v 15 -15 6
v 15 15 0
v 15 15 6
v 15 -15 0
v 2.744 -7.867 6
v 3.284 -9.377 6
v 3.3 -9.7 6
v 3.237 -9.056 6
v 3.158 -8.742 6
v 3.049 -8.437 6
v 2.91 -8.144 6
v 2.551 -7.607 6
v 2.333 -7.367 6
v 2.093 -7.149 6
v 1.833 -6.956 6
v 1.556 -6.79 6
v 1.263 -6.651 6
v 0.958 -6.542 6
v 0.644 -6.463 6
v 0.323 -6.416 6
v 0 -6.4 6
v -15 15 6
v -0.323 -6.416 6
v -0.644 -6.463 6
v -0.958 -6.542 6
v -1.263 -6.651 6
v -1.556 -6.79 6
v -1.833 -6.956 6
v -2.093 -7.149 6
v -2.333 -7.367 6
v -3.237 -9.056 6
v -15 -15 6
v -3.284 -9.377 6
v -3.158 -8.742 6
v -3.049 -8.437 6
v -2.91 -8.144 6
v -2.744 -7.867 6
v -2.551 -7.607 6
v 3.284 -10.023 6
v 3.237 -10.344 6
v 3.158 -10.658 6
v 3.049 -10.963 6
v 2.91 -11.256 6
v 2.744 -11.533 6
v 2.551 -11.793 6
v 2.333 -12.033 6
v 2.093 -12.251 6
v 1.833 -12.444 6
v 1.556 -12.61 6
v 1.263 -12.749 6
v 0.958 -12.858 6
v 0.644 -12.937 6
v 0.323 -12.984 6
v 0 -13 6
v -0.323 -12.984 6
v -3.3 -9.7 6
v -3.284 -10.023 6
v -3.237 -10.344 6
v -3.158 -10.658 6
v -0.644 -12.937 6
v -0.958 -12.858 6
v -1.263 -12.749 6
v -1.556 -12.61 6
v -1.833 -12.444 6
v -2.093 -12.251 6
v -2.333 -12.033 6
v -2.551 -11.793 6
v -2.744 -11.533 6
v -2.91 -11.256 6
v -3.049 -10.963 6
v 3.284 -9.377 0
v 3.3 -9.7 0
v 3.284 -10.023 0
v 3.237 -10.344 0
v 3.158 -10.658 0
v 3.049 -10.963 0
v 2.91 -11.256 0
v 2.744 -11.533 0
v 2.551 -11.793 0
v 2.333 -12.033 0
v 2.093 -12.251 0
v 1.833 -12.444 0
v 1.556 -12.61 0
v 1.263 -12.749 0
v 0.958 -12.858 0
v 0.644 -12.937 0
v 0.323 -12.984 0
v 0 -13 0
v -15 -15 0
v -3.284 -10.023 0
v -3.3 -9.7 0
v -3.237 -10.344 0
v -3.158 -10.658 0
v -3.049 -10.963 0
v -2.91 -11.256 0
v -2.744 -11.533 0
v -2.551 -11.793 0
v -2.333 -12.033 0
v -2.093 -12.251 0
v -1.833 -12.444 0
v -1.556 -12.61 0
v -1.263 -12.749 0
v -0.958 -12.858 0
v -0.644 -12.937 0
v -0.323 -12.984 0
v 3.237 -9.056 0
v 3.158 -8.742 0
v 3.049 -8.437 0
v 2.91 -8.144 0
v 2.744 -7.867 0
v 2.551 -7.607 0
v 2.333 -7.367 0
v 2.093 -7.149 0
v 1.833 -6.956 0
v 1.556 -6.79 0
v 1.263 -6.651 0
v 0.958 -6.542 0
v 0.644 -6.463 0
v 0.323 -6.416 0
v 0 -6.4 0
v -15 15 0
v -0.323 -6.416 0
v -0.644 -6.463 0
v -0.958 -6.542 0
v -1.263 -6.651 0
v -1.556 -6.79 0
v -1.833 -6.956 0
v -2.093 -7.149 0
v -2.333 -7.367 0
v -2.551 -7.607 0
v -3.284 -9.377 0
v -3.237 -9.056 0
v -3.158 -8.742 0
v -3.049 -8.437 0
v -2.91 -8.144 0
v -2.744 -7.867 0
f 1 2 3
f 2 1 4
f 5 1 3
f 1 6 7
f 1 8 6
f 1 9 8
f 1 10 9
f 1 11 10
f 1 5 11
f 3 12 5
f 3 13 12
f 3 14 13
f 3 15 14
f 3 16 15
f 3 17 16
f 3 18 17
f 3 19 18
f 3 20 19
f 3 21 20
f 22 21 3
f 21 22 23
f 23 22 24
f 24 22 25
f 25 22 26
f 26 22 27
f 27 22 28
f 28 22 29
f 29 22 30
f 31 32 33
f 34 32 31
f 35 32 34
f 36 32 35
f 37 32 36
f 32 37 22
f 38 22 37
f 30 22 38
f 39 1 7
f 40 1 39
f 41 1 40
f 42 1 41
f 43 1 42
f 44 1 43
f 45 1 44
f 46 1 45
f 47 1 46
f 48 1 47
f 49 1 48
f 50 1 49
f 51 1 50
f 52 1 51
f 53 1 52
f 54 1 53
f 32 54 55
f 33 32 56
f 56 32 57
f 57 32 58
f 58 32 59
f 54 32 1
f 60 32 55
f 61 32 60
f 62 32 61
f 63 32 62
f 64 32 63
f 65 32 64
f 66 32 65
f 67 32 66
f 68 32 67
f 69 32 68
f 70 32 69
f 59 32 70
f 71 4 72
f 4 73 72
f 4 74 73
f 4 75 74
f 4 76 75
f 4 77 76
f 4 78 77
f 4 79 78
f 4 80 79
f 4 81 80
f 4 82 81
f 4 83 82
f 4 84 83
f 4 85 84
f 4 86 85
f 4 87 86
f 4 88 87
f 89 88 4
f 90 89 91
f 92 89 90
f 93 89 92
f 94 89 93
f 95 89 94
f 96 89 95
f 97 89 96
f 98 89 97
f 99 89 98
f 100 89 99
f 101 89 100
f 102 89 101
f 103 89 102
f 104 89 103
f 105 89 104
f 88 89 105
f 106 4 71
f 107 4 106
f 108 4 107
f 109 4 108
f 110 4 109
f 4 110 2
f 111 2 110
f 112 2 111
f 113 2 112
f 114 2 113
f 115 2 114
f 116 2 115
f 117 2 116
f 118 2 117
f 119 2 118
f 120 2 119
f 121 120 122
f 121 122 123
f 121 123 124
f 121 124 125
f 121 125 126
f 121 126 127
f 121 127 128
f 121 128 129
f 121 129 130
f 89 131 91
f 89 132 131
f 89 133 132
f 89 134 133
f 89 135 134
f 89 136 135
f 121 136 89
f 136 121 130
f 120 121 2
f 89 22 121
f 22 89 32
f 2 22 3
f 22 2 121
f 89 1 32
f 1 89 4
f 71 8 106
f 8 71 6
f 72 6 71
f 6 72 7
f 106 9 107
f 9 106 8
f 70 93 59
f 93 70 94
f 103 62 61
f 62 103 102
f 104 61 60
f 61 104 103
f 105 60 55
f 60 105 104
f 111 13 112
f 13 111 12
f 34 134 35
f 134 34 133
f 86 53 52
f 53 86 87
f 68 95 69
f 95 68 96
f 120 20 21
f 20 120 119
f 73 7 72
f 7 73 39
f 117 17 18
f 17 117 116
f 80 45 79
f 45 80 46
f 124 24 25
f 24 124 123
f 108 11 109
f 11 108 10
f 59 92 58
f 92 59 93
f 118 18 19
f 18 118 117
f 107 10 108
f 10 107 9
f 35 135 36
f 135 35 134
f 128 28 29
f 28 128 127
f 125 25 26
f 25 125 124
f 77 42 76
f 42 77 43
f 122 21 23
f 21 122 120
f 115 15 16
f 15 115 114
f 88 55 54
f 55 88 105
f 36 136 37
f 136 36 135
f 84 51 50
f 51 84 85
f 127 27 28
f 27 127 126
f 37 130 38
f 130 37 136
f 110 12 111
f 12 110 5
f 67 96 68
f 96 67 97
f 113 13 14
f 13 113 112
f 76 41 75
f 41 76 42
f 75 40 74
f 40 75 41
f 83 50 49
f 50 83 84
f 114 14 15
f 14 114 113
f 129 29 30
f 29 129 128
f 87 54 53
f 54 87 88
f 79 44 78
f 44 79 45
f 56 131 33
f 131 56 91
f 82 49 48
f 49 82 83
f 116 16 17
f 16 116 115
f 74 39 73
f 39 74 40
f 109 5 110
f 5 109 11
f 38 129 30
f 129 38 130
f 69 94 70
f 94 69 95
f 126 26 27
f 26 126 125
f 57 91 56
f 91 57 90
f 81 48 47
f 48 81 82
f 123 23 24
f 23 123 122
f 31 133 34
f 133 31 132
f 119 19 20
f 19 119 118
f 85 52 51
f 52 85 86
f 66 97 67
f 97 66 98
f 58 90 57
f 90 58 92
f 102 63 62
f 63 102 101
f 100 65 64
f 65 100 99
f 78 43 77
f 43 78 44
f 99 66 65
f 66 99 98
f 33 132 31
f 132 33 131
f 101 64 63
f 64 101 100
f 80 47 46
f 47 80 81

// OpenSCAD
// Proves check_features.py catches a hole whose diameter AND centre shifted
// together (inset = d/2 + wall_min): the distance from the OLD axis point to
// the NEAR wall stays d_old/2 = 2.75 mm even when an M5 (5.5) hole is replaced
// by M6 (6.6) shifted by +0.55 mm. Measuring only poly.exterior.distance(probe)
// passed this (audit 2026-11-02 §5 #3, found by geom_mutation.py on bracket_l).

$fn = 64;

// EXPECTED_BBOX: [30, 30, 6]
// EXPECTED_HOLE: [0, -10.25, 3, "Z", 5.5]

// Bug: M6 (6.6 mm) at y = -15 + 6.6/2 + 2 = -9.70 instead of M5 (5.5 mm) at -10.25.
difference() {
    translate([-15, -15, 0]) cube([30, 30, 6]);
    translate([0, -9.70, -1]) cylinder(d = 6.6, h = 8);
}
